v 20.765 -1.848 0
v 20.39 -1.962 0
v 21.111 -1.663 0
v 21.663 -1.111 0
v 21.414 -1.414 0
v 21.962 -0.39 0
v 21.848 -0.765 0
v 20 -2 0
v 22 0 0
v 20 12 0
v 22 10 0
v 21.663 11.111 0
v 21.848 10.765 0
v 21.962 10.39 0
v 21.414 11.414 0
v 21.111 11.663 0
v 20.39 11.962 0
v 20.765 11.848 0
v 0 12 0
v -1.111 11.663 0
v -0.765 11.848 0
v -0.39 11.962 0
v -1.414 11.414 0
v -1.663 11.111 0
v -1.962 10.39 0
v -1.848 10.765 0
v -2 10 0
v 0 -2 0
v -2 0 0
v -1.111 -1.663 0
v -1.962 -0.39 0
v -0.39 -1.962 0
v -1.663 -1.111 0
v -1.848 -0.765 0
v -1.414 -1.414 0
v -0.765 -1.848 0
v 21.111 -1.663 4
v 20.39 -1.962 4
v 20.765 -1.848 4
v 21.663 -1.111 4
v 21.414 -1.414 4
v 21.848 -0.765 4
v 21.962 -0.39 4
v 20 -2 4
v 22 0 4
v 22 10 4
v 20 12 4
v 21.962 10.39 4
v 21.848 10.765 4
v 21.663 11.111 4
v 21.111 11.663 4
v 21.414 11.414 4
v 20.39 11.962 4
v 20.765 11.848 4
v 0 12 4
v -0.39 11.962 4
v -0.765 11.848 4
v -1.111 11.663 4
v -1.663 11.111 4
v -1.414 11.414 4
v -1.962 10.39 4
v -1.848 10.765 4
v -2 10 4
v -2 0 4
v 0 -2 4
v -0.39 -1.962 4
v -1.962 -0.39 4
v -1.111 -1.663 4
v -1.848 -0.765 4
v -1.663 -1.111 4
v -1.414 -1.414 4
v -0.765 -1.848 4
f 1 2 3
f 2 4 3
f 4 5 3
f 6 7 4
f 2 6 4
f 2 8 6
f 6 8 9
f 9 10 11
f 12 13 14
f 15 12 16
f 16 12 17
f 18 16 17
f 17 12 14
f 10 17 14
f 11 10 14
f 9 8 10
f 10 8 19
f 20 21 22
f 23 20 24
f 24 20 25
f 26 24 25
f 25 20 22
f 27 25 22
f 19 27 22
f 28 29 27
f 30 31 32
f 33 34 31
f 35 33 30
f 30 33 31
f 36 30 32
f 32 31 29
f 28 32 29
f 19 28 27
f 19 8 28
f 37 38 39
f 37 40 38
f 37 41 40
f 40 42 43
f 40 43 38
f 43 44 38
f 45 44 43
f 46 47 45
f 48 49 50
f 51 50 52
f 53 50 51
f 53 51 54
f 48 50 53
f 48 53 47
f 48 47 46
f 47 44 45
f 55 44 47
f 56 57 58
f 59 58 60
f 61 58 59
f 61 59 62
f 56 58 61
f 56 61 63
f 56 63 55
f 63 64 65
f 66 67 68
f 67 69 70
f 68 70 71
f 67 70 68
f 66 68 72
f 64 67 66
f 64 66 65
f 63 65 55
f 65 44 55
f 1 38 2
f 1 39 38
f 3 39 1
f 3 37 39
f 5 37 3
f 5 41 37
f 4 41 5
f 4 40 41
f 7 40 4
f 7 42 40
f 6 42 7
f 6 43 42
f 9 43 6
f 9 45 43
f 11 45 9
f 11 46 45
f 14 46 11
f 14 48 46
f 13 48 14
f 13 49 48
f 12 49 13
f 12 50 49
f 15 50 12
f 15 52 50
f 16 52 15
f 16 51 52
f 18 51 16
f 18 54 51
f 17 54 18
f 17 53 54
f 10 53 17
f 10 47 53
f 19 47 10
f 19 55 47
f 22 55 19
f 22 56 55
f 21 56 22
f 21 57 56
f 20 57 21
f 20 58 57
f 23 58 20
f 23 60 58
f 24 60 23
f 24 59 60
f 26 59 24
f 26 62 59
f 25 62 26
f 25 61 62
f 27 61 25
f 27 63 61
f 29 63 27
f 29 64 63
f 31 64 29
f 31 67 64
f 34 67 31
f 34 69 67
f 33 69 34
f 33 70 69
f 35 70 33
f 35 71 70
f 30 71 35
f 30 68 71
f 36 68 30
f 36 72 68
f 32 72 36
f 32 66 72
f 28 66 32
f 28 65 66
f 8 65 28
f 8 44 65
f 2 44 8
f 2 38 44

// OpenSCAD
// offset(r): round a rectangle's corners, then extrude (2D subsystem end-to-end).
linear_extrude(4) offset(r = 2, $fn = 32) square([20, 10]);
